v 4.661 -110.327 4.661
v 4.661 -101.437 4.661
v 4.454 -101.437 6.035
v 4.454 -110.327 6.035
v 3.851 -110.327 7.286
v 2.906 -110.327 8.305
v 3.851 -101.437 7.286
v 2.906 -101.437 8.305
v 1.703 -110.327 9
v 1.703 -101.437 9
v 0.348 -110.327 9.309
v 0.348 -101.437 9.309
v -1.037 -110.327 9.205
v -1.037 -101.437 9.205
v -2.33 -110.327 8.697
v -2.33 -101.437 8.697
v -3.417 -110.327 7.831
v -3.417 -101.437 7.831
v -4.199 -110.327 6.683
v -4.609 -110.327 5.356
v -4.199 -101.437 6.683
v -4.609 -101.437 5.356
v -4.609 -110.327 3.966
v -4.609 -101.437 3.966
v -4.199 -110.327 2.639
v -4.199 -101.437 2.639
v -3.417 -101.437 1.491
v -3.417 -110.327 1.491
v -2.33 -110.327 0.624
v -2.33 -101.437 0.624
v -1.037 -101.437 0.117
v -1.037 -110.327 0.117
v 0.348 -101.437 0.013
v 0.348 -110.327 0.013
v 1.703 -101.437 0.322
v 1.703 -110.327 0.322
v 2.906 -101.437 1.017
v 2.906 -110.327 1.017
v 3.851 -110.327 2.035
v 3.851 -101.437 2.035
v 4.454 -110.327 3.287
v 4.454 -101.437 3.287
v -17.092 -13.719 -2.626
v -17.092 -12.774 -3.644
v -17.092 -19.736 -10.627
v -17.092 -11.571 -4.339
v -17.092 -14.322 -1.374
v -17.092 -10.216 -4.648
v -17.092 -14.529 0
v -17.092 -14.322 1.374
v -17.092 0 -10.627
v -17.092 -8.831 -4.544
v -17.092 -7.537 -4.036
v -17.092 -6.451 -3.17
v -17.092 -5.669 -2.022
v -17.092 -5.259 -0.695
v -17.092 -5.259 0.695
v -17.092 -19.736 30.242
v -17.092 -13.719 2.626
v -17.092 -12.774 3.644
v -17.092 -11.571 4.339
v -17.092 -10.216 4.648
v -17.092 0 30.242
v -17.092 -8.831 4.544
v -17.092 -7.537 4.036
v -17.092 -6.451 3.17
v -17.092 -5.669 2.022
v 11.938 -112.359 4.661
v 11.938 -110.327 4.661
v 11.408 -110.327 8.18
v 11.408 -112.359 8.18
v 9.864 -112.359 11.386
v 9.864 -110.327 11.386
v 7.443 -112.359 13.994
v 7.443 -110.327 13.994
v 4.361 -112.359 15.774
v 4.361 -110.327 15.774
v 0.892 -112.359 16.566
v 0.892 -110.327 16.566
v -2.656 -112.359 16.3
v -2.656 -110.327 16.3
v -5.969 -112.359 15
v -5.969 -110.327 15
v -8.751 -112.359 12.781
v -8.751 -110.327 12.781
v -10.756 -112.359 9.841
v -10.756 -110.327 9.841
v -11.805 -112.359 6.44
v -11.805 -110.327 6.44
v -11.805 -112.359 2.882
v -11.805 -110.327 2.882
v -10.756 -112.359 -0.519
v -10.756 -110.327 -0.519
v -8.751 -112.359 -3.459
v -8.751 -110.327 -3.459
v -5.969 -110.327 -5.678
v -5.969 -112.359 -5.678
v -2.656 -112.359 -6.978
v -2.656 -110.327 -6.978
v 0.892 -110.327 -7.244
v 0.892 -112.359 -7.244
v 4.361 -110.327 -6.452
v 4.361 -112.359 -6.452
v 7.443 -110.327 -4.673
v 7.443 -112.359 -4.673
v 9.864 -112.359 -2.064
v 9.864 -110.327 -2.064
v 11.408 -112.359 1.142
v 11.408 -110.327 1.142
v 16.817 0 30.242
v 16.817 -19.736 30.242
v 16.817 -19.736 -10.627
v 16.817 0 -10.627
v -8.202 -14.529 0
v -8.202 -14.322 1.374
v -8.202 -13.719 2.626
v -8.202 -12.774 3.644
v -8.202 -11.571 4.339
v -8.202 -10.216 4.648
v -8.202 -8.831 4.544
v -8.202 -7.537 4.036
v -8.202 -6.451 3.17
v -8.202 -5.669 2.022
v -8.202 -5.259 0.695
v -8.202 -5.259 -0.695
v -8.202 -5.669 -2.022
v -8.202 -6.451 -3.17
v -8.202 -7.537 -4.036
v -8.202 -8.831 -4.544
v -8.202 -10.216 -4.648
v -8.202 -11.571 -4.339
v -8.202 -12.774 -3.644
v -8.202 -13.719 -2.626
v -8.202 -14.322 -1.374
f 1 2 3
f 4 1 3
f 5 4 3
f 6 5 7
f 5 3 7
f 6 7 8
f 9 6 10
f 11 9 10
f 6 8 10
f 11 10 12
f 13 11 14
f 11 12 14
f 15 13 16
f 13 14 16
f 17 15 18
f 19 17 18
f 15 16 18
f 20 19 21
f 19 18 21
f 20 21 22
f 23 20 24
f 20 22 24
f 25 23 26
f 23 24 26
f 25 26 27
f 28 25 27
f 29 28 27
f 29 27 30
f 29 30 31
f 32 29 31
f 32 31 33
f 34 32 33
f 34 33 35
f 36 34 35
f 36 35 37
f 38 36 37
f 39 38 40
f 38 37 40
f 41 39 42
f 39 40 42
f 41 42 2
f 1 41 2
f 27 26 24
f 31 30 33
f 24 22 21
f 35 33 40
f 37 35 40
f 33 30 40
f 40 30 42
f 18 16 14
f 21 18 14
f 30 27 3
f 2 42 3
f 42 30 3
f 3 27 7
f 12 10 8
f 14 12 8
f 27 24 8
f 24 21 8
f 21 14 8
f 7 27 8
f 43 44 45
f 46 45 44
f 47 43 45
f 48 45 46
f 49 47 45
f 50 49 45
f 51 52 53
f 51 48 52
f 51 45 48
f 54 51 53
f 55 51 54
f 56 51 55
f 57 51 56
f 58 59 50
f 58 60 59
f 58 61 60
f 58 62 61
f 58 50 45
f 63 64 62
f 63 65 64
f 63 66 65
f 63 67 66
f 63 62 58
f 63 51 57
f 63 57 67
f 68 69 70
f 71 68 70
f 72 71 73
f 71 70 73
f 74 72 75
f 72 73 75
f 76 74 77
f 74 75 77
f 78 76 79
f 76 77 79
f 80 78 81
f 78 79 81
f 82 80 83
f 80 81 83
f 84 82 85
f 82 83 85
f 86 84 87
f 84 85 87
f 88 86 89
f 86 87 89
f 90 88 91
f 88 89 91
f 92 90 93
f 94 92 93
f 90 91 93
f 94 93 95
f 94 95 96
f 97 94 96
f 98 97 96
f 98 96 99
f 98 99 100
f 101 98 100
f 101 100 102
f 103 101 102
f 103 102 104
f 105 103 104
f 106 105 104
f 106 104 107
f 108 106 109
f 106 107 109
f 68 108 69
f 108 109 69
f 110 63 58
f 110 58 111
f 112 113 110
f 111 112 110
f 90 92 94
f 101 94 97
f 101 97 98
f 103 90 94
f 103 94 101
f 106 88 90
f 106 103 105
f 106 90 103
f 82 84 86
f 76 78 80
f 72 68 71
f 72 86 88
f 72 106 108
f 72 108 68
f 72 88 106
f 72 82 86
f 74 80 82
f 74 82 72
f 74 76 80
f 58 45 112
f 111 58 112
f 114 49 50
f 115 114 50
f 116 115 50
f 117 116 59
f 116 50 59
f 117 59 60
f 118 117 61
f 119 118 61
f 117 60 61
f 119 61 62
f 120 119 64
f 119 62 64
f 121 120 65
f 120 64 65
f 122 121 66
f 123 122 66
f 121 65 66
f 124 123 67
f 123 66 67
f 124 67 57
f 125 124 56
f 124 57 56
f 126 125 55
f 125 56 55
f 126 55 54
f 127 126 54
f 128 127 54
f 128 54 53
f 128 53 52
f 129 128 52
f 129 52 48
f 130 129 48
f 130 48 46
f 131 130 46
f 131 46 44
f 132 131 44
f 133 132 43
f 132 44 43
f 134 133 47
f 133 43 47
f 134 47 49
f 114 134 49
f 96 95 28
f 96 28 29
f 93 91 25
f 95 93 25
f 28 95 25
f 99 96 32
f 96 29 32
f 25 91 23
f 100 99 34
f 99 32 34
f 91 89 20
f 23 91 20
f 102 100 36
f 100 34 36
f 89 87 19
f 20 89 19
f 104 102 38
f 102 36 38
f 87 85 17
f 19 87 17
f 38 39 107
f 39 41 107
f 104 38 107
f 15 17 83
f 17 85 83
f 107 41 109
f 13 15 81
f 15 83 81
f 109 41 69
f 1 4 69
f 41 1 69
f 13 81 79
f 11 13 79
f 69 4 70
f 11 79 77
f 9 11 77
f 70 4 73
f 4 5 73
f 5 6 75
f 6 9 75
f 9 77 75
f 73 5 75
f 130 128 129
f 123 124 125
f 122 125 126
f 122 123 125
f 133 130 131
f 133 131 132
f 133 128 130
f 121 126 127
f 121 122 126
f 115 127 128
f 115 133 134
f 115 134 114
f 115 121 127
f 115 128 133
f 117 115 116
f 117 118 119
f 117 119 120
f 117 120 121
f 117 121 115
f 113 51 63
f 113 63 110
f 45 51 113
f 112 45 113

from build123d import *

# Parameters (mm, degrees)
F0_W     = 33.909
F0_H     = 40.8686
F1_DEPTH = 19.7358
F2_R     = 4.6609
F3_DEPTH = 8.89
F5_R     = 4.6609
F6_DEPTH = 8.89
F7_R     = 11.938
F8_DEPTH = 2.032


with BuildPart() as f1:
    # F0 (on Front) → F1 (new body)
    with BuildSketch(Plane.XZ):
        with Locations((-0.1377054849, 9.807396424)):
            Rectangle(F0_W, F0_H)
    extrude(amount=F1_DEPTH)

    # F2 (on face) → F3 (cut)
    with BuildSketch(Plane(origin=(-17.0922054849, 0, 0), x_dir=(0, -1, 0), z_dir=(-1, 0, 0))):
        with Locations((9.8679, 0)):
            Circle(F2_R)
    extrude(amount=-F3_DEPTH, mode=Mode.SUBTRACT)


with BuildPart() as f6:
    # F5 (on offset) → F6 (new body)
    with BuildSketch(Plane.XZ.offset(101.4367210587)):
        with Locations((0, 4.6609)):
            Circle(F5_R)
    extrude(amount=F6_DEPTH)

    # F7 (on face) → F8 (join)
    with BuildSketch(Plane.XZ.offset(110.3267210587)):
        with Locations((0, 4.6609)):
            Circle(F7_R)
    extrude(amount=F8_DEPTH)


solid = Compound([f1.part, f6.part])
